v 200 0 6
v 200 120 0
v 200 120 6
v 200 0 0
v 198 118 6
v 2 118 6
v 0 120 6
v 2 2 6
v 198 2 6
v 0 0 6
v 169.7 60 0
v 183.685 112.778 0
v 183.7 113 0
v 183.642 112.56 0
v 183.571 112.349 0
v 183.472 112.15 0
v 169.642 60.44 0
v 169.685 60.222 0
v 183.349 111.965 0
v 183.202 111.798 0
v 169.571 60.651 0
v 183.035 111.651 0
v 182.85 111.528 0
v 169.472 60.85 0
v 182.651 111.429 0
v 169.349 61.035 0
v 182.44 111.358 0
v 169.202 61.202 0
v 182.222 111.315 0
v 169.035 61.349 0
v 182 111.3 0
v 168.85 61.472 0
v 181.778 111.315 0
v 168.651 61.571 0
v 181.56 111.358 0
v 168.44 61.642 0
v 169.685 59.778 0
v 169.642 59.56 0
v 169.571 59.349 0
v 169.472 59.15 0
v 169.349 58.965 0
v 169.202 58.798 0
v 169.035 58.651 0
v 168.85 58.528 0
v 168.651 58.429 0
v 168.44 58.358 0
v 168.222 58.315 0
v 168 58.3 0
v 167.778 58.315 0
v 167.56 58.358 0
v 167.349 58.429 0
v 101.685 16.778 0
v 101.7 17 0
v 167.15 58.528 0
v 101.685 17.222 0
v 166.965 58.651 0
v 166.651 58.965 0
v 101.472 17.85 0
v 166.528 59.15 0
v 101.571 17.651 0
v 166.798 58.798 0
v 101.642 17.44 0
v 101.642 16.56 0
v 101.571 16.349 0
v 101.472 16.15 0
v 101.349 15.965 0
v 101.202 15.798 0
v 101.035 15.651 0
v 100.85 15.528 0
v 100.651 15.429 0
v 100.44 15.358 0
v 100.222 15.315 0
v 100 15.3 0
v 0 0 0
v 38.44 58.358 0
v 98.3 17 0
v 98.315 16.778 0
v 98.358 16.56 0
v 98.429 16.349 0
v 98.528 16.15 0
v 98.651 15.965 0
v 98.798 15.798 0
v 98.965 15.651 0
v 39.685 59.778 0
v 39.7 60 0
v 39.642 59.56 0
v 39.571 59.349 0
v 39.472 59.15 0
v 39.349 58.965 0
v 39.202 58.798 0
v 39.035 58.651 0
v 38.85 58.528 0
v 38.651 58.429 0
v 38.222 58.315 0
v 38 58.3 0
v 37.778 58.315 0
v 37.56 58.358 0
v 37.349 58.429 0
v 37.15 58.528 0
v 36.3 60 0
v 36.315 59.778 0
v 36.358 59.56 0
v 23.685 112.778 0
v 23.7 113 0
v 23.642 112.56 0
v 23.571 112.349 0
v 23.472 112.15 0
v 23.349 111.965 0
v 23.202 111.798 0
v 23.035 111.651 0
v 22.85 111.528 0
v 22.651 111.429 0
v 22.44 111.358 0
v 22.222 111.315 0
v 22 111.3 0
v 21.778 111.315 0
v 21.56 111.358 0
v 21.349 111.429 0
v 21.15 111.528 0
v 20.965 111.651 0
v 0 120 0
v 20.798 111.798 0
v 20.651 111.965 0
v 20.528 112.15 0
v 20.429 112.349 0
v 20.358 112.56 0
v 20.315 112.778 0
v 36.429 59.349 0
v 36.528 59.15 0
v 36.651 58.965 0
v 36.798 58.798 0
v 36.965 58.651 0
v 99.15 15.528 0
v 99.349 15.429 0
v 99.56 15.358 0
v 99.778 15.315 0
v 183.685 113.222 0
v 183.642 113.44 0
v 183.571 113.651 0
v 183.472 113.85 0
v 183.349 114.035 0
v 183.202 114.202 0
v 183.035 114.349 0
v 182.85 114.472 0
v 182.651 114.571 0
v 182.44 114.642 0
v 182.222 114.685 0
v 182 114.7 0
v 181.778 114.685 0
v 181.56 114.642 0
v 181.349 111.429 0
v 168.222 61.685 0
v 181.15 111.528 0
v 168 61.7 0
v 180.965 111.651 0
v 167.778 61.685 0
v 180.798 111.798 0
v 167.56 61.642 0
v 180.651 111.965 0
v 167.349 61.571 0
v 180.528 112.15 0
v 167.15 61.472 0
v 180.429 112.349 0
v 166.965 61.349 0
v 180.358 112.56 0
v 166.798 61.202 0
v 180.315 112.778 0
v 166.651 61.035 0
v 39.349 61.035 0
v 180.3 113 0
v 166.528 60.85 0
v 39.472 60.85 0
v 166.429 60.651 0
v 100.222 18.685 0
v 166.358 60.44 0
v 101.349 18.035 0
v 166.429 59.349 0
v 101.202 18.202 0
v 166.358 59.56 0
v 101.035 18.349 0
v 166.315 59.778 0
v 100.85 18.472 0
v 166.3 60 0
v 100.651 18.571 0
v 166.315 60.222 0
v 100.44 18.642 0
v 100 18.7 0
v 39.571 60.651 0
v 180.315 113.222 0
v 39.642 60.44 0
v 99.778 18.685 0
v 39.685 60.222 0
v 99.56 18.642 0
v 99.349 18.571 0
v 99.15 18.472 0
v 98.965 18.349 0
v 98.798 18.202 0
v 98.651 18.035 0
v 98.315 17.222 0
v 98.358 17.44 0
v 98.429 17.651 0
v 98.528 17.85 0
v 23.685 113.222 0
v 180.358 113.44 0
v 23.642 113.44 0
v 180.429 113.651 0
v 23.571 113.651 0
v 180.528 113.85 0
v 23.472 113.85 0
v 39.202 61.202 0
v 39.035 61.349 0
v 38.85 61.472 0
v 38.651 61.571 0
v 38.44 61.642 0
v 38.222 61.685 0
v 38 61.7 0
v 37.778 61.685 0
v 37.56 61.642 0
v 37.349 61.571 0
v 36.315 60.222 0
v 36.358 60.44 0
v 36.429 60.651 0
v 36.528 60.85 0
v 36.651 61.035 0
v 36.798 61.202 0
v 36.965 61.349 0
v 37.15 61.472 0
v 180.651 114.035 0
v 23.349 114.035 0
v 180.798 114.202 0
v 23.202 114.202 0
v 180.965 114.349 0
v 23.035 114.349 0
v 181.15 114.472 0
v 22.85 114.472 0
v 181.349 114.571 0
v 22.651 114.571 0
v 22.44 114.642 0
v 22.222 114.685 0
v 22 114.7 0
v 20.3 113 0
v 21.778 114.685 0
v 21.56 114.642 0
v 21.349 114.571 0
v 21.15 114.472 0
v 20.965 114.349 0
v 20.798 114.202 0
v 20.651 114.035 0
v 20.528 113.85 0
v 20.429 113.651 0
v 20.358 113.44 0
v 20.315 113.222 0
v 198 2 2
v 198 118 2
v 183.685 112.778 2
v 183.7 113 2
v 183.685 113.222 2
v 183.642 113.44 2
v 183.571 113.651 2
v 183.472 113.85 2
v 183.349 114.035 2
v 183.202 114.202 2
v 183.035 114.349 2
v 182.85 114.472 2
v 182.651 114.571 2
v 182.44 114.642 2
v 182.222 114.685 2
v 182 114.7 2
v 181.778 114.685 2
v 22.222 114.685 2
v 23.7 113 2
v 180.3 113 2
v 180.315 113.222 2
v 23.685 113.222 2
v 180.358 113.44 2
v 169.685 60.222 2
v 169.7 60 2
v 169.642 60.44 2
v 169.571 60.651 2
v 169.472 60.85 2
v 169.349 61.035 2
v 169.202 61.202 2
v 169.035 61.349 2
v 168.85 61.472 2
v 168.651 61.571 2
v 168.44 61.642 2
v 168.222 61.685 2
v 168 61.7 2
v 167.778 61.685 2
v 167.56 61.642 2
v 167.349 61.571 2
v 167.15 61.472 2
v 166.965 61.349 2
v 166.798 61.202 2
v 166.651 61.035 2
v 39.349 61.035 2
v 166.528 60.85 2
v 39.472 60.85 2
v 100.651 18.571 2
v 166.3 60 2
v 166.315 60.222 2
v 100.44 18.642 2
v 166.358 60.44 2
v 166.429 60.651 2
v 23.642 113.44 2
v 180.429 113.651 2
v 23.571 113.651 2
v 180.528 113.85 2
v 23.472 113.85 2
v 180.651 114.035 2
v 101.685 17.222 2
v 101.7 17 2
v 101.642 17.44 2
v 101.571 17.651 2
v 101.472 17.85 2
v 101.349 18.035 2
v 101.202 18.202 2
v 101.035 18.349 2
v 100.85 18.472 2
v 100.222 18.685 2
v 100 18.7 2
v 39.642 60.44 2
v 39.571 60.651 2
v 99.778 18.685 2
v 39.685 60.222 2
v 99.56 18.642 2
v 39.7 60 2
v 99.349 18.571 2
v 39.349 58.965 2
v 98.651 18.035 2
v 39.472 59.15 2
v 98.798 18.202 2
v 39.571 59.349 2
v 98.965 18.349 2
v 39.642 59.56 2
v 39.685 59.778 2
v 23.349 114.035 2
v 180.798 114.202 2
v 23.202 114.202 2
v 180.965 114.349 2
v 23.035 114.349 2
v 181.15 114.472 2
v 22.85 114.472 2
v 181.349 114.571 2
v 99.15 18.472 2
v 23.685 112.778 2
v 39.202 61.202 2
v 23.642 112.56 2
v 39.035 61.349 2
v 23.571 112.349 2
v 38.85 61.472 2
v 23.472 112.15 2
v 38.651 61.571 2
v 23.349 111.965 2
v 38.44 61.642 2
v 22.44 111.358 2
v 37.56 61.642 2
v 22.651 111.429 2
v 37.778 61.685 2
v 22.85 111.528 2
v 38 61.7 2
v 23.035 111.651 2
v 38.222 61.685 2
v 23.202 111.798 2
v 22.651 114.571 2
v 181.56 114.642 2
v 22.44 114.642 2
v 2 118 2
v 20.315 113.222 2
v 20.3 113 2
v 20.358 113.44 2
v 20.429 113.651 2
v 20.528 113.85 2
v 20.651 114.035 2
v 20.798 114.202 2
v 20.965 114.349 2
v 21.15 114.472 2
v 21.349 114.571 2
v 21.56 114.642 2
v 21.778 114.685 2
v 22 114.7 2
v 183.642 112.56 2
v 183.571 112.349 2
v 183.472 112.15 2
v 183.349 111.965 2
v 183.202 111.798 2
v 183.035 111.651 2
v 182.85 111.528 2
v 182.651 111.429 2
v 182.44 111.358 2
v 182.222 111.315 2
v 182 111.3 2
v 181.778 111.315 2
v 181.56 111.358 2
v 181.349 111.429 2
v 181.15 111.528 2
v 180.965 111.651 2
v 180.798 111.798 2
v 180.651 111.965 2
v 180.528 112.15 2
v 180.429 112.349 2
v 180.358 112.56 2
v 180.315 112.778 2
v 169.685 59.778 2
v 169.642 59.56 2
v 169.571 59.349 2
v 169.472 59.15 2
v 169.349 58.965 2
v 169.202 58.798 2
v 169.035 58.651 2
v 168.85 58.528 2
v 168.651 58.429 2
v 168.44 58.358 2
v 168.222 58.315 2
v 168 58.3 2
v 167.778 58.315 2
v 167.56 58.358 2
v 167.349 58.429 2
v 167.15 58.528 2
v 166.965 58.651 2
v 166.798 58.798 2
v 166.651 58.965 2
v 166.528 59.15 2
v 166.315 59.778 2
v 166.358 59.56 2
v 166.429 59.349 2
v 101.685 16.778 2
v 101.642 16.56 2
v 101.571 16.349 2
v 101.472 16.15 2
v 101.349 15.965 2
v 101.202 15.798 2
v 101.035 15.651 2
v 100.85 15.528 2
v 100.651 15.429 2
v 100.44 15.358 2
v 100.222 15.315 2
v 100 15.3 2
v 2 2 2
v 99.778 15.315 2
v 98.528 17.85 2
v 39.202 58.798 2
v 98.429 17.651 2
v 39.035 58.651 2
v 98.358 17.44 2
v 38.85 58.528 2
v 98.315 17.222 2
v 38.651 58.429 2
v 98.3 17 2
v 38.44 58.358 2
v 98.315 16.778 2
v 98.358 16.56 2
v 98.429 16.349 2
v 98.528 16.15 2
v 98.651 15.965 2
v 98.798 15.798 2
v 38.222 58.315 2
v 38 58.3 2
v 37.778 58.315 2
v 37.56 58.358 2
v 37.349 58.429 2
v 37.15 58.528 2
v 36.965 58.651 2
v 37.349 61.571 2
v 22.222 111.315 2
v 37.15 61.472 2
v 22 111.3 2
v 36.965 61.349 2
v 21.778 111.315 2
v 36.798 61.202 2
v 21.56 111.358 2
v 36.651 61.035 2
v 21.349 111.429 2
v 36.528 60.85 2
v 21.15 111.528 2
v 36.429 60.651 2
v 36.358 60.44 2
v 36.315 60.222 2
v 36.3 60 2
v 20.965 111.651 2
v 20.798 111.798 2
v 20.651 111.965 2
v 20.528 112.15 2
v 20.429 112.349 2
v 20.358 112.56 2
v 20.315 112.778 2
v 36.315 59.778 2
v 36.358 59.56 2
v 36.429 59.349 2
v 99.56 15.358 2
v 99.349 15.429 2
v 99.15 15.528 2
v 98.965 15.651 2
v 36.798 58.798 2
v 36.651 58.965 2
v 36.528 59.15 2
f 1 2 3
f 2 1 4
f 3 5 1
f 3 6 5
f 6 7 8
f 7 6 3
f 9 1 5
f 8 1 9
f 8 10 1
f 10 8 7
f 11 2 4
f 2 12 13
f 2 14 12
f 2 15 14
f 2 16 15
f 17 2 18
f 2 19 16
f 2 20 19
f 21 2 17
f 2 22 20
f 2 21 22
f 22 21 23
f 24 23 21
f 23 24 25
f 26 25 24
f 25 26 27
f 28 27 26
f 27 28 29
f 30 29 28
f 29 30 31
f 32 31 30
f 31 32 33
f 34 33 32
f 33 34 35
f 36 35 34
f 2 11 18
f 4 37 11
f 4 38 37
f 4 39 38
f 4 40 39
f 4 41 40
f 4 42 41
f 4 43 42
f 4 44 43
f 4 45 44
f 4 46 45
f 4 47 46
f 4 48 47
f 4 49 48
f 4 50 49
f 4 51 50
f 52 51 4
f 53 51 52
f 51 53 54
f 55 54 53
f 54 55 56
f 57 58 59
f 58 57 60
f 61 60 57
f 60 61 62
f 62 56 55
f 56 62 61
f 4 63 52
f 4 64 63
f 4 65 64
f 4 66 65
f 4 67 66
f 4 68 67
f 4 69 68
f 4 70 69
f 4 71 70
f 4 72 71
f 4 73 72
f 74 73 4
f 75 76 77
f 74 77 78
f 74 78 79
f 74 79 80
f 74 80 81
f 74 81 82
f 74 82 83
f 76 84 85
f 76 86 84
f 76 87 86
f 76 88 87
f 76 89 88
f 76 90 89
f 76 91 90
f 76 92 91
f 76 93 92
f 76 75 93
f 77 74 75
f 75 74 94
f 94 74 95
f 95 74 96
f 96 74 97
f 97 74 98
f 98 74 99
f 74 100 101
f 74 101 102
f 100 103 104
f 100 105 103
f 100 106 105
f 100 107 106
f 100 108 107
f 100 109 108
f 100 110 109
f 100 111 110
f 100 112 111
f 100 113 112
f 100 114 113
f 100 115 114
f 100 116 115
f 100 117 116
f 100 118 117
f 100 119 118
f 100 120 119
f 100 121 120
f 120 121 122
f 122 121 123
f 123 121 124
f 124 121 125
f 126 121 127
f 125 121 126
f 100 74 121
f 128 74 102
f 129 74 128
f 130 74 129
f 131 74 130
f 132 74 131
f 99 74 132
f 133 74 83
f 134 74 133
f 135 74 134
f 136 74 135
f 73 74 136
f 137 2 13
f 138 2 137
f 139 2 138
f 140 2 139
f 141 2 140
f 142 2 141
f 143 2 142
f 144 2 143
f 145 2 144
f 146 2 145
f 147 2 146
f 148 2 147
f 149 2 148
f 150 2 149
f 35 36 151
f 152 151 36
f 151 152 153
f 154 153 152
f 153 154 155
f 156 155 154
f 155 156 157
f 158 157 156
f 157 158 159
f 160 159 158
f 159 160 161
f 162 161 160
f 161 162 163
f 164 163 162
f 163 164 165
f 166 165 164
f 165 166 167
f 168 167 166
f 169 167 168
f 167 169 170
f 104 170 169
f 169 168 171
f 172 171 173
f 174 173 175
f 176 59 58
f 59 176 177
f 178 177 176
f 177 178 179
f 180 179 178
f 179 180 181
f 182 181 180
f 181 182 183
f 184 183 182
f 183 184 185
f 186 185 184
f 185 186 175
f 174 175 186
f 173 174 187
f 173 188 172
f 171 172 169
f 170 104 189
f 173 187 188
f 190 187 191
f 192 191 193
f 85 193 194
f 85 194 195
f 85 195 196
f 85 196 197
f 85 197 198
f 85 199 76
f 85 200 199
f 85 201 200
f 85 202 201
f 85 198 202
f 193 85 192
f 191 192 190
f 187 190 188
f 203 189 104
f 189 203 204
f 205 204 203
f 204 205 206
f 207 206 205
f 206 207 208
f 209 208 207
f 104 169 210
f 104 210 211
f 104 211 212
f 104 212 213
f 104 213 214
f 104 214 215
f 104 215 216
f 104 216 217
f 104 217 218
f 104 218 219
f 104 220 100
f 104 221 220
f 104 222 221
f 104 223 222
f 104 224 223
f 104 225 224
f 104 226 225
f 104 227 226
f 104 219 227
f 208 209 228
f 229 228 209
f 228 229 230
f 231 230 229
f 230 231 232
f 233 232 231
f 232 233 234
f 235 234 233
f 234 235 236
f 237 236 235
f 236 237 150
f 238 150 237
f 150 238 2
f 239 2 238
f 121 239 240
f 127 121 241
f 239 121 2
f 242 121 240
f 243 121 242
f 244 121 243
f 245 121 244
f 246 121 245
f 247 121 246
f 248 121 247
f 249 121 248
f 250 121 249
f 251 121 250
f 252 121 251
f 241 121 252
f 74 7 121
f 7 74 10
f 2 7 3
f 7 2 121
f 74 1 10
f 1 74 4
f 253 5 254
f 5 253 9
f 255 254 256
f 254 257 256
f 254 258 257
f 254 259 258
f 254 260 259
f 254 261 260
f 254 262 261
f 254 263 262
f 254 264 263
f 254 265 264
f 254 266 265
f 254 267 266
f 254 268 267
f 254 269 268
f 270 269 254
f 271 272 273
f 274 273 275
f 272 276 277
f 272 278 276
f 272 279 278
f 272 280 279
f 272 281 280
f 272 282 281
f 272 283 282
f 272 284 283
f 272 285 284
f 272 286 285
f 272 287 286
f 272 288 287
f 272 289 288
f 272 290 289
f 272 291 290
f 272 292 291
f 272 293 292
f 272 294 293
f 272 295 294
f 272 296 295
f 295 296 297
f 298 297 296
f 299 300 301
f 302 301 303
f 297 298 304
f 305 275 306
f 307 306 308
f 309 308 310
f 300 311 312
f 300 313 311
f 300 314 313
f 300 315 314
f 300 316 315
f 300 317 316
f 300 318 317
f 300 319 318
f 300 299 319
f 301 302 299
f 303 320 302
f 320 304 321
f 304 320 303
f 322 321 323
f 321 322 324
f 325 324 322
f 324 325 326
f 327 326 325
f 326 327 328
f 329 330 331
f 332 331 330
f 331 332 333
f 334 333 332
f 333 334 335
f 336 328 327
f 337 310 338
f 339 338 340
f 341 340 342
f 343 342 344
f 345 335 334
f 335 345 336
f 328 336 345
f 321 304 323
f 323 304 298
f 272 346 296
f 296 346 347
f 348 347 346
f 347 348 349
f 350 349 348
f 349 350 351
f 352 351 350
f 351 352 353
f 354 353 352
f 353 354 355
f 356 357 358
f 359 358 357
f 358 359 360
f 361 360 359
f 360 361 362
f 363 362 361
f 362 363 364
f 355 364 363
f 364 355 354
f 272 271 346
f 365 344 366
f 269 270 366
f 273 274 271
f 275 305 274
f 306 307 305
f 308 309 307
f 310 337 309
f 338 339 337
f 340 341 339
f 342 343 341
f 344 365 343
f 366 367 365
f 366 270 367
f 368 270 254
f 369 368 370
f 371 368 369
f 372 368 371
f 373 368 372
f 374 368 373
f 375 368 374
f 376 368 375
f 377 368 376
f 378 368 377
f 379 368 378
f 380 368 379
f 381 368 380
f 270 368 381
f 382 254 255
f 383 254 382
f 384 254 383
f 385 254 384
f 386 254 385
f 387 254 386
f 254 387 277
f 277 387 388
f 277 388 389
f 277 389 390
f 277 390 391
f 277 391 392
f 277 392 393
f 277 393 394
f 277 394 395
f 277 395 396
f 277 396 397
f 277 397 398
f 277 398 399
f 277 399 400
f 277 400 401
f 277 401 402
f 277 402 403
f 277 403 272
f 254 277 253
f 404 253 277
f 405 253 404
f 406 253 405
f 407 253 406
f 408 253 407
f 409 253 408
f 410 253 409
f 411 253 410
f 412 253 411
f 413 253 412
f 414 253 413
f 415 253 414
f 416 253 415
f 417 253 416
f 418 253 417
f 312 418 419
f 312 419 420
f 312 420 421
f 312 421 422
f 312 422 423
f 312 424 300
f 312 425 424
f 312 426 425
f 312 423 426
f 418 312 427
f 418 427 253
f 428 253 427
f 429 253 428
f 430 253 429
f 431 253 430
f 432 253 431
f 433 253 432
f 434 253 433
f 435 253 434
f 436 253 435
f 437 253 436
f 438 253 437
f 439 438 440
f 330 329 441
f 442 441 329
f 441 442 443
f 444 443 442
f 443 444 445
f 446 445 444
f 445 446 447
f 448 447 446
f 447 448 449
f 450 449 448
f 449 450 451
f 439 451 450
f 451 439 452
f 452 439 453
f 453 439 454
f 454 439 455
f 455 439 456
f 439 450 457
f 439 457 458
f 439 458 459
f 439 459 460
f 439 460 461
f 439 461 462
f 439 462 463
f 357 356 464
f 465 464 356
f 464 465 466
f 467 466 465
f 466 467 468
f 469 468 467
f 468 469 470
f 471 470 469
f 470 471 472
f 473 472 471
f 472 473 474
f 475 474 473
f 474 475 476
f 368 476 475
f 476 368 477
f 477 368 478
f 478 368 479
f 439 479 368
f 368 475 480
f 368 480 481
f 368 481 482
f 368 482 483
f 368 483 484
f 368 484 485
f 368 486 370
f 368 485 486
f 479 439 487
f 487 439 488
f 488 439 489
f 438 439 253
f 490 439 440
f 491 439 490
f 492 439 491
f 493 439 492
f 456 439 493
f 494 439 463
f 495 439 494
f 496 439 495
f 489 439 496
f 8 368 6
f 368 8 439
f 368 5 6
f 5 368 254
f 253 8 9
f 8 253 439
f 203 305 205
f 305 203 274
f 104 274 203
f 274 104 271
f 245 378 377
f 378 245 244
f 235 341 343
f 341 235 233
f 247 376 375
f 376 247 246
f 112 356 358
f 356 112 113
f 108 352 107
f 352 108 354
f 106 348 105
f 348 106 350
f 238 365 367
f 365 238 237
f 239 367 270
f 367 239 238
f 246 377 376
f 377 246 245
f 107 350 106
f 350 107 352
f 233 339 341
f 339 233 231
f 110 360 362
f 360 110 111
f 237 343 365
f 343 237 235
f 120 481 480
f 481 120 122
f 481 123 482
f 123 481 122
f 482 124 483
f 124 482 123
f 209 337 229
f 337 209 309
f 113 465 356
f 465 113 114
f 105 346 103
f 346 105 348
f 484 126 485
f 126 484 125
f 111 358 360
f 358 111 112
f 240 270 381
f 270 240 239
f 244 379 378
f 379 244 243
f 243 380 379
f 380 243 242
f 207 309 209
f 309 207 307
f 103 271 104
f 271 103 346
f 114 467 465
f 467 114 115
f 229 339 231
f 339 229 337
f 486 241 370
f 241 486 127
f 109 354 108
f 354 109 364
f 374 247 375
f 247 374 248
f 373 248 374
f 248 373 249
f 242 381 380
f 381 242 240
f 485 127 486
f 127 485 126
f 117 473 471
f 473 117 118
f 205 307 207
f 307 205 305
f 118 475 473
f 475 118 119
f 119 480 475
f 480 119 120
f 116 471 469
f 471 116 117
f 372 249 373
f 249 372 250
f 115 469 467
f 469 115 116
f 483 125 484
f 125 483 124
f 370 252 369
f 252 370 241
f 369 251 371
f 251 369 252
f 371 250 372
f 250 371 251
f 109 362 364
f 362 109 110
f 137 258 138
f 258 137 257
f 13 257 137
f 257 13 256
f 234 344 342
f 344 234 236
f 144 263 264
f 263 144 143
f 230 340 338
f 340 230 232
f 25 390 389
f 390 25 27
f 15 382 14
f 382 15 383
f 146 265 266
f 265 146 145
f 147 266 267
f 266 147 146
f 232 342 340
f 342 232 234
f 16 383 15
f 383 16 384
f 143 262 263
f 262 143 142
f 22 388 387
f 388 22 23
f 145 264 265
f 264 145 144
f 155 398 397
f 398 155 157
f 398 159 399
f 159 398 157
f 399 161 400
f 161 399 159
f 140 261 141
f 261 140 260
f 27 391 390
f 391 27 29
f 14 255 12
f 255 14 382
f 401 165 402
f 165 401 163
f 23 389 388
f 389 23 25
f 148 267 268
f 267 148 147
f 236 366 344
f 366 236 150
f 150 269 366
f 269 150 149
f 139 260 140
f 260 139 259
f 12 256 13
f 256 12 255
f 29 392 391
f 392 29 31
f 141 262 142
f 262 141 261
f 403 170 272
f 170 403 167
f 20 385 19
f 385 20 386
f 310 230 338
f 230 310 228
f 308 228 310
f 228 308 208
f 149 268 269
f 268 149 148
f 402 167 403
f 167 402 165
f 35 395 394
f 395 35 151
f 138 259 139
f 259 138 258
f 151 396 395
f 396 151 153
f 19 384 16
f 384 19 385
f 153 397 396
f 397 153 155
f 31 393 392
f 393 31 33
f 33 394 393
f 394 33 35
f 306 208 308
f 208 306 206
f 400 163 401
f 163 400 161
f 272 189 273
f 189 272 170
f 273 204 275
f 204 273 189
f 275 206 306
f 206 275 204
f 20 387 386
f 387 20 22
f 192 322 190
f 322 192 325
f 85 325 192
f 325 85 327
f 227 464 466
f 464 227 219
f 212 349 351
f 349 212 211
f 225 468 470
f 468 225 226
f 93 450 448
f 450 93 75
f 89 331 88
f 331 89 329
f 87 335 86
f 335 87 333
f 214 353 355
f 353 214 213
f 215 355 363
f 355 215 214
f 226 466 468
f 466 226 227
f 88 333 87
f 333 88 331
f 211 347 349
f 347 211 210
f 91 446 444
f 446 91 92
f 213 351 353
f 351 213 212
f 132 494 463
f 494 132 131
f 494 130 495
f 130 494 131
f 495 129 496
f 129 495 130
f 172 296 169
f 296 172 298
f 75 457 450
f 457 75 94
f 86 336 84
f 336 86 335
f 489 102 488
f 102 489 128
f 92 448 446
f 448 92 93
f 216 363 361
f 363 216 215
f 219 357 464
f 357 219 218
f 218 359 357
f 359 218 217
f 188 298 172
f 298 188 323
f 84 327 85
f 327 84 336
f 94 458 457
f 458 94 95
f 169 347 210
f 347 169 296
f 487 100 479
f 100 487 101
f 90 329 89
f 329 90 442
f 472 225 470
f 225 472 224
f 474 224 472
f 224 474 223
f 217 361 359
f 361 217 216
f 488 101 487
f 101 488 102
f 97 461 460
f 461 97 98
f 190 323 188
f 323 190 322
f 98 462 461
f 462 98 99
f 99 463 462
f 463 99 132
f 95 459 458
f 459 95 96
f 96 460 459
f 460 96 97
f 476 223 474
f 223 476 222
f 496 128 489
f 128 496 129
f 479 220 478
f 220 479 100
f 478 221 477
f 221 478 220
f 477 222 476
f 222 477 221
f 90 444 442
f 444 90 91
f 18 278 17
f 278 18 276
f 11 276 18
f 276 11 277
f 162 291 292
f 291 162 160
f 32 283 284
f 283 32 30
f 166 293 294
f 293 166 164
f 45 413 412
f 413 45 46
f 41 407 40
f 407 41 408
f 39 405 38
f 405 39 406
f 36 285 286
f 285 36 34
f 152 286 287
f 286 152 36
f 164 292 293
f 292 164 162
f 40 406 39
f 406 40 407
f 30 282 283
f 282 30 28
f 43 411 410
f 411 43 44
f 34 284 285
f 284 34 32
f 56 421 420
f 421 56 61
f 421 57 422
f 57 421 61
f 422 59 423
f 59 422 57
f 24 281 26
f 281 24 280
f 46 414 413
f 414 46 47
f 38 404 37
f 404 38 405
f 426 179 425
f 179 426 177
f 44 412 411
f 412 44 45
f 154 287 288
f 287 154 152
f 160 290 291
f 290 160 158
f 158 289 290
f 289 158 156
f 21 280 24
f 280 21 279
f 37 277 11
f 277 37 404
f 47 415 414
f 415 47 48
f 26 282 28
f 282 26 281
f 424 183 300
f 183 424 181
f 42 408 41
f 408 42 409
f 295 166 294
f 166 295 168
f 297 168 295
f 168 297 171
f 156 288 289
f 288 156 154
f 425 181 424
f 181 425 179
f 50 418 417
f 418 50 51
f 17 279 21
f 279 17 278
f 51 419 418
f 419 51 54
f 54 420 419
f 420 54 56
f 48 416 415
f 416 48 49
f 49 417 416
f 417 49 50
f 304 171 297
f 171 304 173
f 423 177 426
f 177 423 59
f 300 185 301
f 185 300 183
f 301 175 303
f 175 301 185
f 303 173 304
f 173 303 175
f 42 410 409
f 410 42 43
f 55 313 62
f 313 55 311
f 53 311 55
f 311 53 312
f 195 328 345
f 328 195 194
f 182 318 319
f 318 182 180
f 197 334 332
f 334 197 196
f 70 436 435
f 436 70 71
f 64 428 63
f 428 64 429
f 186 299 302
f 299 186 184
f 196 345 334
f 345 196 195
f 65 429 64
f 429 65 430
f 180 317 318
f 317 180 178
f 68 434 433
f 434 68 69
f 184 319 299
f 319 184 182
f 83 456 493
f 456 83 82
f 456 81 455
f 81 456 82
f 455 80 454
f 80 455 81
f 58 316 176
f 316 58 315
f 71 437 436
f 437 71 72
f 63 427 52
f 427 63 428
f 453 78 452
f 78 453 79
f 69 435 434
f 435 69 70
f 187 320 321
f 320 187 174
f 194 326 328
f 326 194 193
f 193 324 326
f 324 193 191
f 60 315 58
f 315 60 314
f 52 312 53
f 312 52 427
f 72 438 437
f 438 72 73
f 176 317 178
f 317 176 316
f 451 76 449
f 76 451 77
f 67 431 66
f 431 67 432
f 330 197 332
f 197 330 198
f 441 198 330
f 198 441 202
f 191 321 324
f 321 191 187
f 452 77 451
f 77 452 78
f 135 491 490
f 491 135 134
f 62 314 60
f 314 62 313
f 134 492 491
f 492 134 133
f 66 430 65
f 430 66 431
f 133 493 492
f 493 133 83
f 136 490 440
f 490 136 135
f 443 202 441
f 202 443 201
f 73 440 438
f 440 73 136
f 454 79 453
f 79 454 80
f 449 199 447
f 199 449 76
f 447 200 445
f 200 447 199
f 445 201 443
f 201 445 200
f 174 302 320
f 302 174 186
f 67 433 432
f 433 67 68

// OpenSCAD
// Grid — Portacosas
// Tiled tray system: rows × cols array with snap-fit connectors

// Included (not `use`d) because the grid needs desk_organizer.scad's globals as
// well as its modules. `is_library` suppresses that file's own top-level render,
// which otherwise drew a stray tray_base() at the origin under the grid.
desk_organizer_as_library = true;
include <desk_organizer.scad>

// Grid parameters (overridden by manifest)
rows = 1;
cols = 1;

// Connector dimensions
connector_w = 10;
connector_h = 4;
connector_d = 8;

// Grid spacing
grid_gap = 2; // gap between tiles

// --- Connector modules ---
module grid_connector_male() {
    translate([0, 0, 0])
        cube([connector_w, connector_d, connector_h]);
    // Snap ridge
    translate([connector_w * 0.2, connector_d, connector_h * 0.3])
        cube([connector_w * 0.6, 1, connector_h * 0.4]);
}

module grid_connector_female() {
    translate([0, 0, -0.05])
        cube([connector_w + snap_tol*2,
              connector_d + snap_tol*2,
              connector_h + 0.1]);
    // Snap ridge slot
    translate([connector_w * 0.2 - snap_tol, connector_d,
               connector_h * 0.3 - snap_tol])
        cube([connector_w * 0.6 + snap_tol*2,
              1 + snap_tol*2,
              connector_h * 0.4 + snap_tol*2]);
}

// --- Grid Assembly ---
for (r = [0 : rows - 1]) {
    for (c = [0 : cols - 1]) {
        translate([c * (tray_width + grid_gap),
                   r * (tray_depth + grid_gap),
                   0]) {
            difference() {
                tray_base();
                // Female connectors on right edge (except last col)
                if (c < cols - 1) {
                    translate([tray_width - 0.1,
                               (tray_depth - connector_d) / 2,
                               0])
                        grid_connector_female();
                }
                // Female connectors on top edge (except last row)
                if (r < rows - 1) {
                    translate([(tray_width - connector_w) / 2,
                               tray_depth - 0.1,
                               0])
                        rotate([0, 0, 0])
                            grid_connector_female();
                }
            }
            // Male connectors on left edge (except first col)
            if (c > 0) {
                translate([-grid_gap,
                           (tray_depth - connector_d) / 2,
                           0])
                    grid_connector_male();
            }
            // Male connectors on bottom edge (except first row)
            if (r > 0) {
                translate([(tray_width - connector_w) / 2,
                           -grid_gap,
                           0])
                    grid_connector_male();
            }
        }
    }
}
